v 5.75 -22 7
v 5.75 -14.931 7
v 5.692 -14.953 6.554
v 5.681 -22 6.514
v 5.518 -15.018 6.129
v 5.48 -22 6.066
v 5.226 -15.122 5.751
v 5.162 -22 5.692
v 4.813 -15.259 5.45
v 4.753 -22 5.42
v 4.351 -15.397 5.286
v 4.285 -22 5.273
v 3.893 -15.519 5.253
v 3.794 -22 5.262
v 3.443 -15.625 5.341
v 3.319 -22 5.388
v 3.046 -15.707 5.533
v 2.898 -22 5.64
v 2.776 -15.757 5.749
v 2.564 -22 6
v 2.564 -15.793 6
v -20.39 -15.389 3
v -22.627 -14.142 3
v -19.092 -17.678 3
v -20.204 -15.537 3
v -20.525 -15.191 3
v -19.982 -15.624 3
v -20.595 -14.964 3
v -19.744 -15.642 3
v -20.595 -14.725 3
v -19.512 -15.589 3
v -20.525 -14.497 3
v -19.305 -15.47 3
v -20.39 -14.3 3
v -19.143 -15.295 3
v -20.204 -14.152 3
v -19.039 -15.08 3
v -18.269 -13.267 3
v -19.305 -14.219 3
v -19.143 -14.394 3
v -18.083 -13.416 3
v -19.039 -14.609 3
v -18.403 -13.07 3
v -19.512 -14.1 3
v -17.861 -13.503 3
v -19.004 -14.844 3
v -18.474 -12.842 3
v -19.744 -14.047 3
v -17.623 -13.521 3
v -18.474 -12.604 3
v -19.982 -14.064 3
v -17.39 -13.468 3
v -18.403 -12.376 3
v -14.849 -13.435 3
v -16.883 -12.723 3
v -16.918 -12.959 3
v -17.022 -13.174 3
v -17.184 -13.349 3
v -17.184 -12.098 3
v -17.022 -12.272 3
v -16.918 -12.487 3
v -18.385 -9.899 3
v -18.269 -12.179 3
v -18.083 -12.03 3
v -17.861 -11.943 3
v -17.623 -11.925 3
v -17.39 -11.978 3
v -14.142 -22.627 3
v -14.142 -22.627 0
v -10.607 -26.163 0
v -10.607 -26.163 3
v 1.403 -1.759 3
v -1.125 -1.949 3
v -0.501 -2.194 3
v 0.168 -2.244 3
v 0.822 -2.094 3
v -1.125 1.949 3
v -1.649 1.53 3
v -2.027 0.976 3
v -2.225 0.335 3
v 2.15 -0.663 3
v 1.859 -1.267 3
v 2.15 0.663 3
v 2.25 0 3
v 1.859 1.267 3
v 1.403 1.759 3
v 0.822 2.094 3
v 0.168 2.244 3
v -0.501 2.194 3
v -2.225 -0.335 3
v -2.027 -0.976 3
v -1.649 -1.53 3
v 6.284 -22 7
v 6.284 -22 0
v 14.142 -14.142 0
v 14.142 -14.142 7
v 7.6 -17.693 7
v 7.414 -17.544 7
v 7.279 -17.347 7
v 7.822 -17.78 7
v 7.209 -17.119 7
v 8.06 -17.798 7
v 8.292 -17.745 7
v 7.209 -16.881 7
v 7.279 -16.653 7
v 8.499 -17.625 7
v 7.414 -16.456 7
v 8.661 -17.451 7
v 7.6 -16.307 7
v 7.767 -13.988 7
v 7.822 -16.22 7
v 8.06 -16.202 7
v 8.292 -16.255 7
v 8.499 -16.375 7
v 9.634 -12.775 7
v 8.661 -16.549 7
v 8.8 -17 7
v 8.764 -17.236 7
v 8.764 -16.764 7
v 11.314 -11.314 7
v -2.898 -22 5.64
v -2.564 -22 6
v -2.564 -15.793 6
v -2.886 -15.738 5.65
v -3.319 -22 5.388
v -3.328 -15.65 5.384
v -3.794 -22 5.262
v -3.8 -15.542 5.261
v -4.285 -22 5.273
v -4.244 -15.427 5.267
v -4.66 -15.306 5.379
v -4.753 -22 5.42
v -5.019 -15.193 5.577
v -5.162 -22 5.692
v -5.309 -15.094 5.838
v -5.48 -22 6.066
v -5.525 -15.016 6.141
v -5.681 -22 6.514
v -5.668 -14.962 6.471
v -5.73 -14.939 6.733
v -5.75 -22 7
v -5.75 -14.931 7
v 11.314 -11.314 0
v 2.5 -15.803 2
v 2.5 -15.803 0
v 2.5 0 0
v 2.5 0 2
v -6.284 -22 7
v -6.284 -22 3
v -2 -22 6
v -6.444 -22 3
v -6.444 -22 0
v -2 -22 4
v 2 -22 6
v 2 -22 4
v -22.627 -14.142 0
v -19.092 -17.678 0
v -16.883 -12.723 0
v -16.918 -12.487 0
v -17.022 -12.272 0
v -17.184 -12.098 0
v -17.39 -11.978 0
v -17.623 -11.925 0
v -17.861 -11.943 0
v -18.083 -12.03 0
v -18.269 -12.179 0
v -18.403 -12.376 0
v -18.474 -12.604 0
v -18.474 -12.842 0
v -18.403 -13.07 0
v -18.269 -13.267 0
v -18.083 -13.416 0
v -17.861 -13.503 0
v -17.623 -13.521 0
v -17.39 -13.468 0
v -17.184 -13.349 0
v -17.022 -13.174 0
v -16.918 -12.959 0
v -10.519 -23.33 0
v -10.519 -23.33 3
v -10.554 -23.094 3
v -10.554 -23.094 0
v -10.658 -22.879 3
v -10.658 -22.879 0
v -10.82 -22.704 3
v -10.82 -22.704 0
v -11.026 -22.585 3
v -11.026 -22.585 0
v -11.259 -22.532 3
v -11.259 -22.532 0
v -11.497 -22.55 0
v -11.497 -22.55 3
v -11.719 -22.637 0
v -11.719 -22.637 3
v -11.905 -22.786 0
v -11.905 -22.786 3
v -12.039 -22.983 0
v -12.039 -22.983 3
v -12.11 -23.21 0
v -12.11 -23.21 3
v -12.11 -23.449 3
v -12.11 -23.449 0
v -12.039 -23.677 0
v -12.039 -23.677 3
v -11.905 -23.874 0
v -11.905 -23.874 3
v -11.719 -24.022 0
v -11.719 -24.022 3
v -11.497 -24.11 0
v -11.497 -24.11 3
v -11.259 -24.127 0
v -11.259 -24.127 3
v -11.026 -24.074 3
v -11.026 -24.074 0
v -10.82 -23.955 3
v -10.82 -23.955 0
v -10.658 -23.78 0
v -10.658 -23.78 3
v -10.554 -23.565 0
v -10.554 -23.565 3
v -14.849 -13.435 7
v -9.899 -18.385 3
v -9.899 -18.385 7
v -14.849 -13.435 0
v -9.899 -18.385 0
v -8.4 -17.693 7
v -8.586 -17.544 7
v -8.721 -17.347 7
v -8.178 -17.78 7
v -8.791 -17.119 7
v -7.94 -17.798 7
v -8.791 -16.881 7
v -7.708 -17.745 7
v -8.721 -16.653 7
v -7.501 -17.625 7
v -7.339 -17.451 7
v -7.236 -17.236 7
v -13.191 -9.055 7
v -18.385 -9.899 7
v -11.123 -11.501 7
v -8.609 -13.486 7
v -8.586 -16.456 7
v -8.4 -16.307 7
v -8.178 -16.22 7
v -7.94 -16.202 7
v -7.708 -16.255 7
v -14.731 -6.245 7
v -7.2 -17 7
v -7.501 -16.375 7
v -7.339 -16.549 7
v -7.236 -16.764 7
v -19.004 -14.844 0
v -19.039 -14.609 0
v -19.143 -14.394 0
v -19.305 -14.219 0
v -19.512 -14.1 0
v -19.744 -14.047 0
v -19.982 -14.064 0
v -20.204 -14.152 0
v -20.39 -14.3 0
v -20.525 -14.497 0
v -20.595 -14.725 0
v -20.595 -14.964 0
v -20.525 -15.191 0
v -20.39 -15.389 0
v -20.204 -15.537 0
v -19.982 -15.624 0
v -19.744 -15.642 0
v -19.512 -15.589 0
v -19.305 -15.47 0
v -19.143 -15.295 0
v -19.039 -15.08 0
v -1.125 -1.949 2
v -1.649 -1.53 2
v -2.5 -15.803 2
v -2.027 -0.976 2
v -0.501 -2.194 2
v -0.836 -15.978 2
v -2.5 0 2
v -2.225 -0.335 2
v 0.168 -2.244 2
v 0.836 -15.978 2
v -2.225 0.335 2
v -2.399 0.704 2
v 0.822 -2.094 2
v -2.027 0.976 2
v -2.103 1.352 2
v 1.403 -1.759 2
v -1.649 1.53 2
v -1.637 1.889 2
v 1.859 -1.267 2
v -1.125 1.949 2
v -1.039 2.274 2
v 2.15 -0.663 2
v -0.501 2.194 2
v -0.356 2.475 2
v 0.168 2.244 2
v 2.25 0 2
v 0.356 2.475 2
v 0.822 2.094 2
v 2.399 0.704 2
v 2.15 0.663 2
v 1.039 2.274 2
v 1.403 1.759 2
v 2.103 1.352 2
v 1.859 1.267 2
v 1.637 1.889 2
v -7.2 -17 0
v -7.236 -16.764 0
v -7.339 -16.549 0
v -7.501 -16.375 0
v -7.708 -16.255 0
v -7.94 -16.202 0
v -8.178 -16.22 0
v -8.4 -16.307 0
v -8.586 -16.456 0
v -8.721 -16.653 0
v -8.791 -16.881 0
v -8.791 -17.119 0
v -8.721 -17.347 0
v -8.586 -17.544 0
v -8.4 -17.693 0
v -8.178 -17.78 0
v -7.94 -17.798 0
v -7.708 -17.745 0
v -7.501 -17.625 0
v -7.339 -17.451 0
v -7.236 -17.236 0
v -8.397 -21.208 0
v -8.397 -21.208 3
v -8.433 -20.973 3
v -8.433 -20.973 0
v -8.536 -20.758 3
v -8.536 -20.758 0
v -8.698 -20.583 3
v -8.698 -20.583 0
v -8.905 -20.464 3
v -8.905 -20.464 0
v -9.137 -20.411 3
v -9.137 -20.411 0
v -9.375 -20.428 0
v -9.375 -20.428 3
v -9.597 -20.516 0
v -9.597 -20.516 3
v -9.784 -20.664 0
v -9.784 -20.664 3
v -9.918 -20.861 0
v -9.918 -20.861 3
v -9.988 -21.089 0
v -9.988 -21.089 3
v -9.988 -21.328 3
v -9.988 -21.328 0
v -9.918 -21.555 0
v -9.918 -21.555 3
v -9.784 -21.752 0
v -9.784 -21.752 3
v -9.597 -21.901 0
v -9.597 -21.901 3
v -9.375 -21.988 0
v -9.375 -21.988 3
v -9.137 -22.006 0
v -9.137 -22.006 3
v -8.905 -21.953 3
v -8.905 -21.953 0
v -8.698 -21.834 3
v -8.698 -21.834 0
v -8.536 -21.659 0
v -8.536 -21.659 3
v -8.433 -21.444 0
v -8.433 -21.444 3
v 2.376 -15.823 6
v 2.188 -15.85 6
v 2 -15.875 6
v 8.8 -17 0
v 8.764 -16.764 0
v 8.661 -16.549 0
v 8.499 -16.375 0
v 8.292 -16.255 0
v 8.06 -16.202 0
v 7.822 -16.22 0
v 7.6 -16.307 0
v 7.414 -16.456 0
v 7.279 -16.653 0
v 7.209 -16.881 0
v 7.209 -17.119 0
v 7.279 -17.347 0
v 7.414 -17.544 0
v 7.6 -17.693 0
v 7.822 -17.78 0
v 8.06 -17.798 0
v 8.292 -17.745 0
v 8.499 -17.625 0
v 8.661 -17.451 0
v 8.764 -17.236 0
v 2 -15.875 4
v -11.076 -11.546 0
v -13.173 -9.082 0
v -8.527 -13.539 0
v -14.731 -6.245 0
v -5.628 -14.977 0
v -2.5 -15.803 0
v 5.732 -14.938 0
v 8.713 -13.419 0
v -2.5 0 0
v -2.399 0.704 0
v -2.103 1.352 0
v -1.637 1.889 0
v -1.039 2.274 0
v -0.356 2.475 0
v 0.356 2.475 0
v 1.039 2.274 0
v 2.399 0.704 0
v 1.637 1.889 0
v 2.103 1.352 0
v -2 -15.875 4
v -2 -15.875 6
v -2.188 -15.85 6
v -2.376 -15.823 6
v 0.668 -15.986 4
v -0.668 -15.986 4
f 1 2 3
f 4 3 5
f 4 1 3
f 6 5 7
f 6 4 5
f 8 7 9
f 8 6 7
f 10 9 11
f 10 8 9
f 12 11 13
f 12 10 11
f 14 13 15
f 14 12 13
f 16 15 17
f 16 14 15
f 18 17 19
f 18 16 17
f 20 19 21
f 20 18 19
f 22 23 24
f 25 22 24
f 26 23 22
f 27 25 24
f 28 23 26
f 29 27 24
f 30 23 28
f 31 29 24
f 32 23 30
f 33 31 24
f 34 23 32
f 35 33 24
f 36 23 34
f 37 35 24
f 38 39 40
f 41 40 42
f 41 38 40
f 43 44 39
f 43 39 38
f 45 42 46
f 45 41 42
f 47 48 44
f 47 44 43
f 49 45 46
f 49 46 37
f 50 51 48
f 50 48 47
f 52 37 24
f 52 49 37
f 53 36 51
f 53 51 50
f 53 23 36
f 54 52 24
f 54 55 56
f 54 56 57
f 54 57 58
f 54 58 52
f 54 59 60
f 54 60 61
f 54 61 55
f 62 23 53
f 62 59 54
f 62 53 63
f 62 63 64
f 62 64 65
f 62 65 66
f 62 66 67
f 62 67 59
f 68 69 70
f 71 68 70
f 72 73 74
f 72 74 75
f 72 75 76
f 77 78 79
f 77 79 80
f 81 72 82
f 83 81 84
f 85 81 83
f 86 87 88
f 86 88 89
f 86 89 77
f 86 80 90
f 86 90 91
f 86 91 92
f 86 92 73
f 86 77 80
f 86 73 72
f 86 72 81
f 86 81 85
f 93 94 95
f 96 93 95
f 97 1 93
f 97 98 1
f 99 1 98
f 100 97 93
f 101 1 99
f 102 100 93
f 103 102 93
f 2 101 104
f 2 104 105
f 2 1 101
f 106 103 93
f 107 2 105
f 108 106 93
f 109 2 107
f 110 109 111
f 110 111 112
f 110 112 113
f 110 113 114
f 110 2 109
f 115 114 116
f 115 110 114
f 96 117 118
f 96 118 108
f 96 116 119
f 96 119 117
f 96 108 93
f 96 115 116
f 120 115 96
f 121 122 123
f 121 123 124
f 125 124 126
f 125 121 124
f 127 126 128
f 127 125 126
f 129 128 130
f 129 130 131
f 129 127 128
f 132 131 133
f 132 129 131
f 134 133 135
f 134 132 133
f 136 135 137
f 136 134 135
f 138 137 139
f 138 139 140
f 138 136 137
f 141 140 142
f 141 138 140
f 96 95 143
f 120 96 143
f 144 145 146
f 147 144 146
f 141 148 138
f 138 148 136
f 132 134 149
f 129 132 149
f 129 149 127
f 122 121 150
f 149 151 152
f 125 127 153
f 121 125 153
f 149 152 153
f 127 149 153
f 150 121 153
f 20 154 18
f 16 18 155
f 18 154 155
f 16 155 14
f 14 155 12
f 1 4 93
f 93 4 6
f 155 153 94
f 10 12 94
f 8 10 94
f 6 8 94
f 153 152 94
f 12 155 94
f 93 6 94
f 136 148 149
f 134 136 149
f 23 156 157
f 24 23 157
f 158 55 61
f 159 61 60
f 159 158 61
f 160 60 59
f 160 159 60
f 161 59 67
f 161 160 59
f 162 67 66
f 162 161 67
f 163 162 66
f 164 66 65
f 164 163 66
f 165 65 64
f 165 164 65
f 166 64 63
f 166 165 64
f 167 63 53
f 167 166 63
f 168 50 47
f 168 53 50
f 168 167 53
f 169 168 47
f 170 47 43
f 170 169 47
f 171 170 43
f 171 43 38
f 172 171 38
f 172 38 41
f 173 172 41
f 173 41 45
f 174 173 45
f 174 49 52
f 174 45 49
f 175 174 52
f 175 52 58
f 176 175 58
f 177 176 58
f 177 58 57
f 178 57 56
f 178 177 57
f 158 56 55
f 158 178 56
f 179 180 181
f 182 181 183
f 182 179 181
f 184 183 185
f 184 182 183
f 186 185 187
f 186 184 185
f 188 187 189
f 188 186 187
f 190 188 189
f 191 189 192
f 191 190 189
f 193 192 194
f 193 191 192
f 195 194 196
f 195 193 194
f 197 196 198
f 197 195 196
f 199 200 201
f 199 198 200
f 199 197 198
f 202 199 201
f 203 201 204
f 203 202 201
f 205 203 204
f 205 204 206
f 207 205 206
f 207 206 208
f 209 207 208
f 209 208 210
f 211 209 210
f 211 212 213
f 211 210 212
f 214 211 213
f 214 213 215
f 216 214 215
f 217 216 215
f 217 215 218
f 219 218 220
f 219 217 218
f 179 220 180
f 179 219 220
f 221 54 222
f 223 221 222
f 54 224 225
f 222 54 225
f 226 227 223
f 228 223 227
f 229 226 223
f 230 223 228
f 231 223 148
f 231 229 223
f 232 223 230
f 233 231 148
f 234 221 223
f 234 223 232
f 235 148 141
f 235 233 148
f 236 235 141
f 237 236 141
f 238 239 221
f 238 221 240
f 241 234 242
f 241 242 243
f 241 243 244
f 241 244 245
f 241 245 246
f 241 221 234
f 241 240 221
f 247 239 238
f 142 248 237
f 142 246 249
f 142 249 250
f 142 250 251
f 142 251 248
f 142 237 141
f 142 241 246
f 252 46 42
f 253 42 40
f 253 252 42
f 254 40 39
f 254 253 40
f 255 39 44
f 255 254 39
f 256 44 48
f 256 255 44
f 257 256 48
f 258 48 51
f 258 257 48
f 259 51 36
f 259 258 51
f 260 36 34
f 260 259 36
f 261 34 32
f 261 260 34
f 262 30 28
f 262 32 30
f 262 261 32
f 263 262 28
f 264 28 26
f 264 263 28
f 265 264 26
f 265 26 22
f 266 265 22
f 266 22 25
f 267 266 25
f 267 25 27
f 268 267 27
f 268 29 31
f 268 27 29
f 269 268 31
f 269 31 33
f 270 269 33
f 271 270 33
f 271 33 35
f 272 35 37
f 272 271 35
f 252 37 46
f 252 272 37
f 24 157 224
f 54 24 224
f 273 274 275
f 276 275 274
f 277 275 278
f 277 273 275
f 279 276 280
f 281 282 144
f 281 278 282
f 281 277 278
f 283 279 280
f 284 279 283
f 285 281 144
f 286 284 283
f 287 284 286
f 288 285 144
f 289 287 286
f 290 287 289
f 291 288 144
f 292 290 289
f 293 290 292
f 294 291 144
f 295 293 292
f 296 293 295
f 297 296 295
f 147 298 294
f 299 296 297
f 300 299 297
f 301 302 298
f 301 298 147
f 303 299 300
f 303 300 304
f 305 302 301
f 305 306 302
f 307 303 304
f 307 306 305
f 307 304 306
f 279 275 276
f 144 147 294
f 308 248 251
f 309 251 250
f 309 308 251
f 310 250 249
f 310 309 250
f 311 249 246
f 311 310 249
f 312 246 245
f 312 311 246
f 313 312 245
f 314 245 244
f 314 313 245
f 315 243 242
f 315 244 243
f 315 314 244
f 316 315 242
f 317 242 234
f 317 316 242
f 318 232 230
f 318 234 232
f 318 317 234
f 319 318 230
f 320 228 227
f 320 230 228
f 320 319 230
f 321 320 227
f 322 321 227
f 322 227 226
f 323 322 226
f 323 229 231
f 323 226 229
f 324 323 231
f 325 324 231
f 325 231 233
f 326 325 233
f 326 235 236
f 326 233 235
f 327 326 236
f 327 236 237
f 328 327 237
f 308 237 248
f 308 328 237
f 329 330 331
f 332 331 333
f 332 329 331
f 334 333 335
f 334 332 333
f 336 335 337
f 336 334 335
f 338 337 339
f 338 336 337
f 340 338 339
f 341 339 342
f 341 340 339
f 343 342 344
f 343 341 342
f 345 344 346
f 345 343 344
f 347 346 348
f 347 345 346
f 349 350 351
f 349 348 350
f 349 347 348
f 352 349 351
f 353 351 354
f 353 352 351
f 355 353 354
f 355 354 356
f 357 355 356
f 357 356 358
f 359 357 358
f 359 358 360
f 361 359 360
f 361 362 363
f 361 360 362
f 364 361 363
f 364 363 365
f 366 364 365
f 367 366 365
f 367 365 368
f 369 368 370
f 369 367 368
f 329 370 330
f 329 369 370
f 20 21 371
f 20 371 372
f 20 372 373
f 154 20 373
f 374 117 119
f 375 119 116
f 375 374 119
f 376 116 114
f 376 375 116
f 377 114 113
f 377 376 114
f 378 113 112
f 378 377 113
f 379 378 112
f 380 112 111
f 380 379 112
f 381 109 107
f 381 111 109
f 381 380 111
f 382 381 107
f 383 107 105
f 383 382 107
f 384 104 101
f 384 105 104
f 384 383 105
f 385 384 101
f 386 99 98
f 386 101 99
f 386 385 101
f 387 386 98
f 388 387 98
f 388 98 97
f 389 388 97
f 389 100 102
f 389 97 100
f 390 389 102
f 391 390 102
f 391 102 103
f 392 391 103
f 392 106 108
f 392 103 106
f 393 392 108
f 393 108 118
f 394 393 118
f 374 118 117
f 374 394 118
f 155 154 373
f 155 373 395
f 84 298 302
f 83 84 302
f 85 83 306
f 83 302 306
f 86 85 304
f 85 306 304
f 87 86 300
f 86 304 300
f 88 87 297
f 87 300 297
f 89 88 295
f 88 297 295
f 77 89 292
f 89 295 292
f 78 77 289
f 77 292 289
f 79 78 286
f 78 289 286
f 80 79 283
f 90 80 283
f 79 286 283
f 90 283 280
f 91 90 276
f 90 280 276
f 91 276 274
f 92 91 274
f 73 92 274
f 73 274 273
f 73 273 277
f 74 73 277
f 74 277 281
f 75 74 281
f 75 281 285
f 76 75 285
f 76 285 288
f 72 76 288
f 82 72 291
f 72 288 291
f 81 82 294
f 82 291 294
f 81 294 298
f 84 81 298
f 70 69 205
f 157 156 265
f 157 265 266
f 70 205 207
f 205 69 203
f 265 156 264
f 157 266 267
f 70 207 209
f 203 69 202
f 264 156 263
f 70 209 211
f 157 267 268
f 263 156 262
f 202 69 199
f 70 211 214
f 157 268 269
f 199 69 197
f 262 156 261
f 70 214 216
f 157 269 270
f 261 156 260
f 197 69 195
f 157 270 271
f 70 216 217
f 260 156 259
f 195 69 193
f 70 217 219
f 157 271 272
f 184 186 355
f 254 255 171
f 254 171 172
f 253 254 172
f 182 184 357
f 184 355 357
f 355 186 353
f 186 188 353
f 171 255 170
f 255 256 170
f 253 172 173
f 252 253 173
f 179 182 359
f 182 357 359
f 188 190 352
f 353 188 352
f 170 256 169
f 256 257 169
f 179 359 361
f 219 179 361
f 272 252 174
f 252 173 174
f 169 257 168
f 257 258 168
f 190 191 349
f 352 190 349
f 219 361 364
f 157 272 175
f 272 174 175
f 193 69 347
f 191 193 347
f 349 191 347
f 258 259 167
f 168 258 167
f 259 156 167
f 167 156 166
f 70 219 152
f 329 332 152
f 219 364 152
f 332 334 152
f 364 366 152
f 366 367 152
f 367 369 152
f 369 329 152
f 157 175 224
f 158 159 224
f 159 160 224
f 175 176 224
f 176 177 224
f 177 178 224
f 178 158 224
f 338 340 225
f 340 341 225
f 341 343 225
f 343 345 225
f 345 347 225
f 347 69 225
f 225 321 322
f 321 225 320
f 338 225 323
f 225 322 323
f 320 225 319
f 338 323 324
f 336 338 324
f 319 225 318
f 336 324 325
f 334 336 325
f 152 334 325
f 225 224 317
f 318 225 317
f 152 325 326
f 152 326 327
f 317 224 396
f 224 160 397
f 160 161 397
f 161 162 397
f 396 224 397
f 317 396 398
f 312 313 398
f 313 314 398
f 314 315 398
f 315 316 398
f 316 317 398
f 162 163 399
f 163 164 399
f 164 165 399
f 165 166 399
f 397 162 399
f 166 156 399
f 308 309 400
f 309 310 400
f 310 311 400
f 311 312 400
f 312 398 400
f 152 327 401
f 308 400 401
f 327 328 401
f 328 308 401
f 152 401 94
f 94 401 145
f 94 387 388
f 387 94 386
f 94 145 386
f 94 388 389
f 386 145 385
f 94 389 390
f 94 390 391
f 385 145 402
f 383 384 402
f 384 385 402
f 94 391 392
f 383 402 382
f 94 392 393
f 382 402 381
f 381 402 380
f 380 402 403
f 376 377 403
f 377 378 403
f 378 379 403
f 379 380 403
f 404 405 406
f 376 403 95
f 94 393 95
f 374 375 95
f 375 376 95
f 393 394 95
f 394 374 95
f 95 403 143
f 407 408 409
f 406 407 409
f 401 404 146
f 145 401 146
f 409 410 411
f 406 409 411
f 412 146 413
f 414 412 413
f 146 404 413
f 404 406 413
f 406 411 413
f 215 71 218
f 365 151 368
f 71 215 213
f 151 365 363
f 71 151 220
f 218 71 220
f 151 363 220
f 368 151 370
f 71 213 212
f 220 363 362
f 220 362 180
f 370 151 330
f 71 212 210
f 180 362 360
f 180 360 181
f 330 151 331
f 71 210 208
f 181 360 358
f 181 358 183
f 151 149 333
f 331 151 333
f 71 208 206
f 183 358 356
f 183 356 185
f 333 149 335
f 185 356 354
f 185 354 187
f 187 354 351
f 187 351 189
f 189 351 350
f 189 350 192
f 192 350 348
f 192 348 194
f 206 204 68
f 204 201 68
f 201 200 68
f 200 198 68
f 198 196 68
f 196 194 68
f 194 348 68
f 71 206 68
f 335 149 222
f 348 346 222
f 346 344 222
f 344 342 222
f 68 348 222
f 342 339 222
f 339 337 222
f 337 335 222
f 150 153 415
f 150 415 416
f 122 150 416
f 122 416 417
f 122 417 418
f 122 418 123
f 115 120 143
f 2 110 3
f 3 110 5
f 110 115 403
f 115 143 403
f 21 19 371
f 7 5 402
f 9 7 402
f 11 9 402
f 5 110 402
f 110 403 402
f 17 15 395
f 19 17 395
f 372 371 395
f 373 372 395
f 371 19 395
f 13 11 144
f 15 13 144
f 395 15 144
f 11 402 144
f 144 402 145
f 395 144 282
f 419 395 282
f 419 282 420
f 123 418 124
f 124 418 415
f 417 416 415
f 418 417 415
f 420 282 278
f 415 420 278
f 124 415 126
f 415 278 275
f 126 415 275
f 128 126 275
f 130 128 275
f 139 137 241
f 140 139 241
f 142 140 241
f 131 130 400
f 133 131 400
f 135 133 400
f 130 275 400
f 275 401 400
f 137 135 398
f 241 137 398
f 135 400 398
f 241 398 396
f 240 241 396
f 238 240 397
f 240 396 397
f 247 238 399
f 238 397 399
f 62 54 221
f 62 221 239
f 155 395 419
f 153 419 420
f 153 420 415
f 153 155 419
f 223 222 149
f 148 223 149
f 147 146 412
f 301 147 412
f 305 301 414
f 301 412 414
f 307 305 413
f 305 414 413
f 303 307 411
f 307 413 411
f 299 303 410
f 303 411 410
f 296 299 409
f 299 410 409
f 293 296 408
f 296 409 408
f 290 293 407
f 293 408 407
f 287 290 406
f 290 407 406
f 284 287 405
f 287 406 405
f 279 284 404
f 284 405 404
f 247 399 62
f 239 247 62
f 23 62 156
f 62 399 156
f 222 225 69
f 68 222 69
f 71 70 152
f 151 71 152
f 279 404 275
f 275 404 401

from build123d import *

# Parameters (mm, degrees)
BOSS_EXTRUDE1_DEPTH = 7
BOSS_EXTRUDE2_DEPTH = 2
BOSS_EXTRUDE3_START = 2
SKETCH3_R           = 2.25
BOSS_EXTRUDE3_DEPTH = 1
CABLE_START         = -22.5
SKETCH6_R           = 1.75
CABLE_TUBES_DEPTH   = 20
WIRE_START          = -22.5
WIRE_CANALS_DEPTH   = 8
SKETCH4_R           = 0.8
SCREW_HOLES_DEPTH   = 8.0000001
CUT_EXTRUDE2_START  = 3
CUT_EXTRUDE2_DEPTH  = 4


with BuildPart() as part:
    # Sketch1 → Boss-Extrude1 (new body)
    with BuildSketch(Plane.XY):
        with BuildLine():
            Line((14.142135624, -14.142135624), (11.313708499, -11.313708499))
            ThreePointArc((11.313708499, -11.313708499), (-3.056276198, -15.70538684), (-14.730729168, -6.245447796))
            Line((-14.730729168, -6.245447796), (-22.627416999, -14.142135627))
            Line((-22.627416999, -14.142135627), (-19.091883095, -17.677669532))
            Line((-19.091883095, -17.677669532), (-14.849242408, -13.435028845))
            Line((-14.849242408, -13.435028845), (-9.899494939, -18.384776313))
            Line((-9.899494939, -18.384776313), (-14.142135626, -22.627417))
            Line((-14.142135626, -22.627417), (-10.60660172, -26.162950906))
            Line((-10.60660172, -26.162950906), (-6.443650814, -22))
            Line((-6.443650814, -22), (6.284271247, -22))
            Line((6.284271247, -22), (14.142135624, -14.142135624))
        make_face()
    extrude(amount=BOSS_EXTRUDE1_DEPTH)

    # Sketch2 → Boss-Extrude2 (add)
    with BuildSketch(Plane.XY):
        with BuildLine():
            Line((-2.5, 0), (-2.5, -22))
            Line((-2.5, -22), (2.5, -22))
            Line((2.5, -22), (2.5, 0))
            ThreePointArc((2.5, 0), (0, 2.5), (-2.5, 0))
        make_face()
    extrude(amount=BOSS_EXTRUDE2_DEPTH)

    # Sketch3 → Boss-Extrude3 (add)
    with BuildSketch(Plane.XY.offset(BOSS_EXTRUDE3_START)):
        Circle(SKETCH3_R)
    extrude(amount=BOSS_EXTRUDE3_DEPTH)

    # Sketch6 → Cable Tubes (cut)
    with BuildSketch(Plane(origin=(0, 0, 0), x_dir=(1, 0, 0), z_dir=(0, 1, 0)).offset(CABLE_START)):
        with Locations((-4, -7)):
            Circle(SKETCH6_R)
        with Locations((4, -7)):
            Circle(SKETCH6_R)
    extrude(amount=CABLE_TUBES_DEPTH, mode=Mode.SUBTRACT)

    # Sketch7 → Wire Canals (cut)
    with BuildSketch(Plane(origin=(0, 0, 0), x_dir=(1, 0, 0), z_dir=(0, 1, 0)).offset(WIRE_START)):
        Polygon((-3, -7), (3, -7), (3, -6), (2, -6), (2, -4), (-2, -4), (-2, -6), (-3, -6), align=None)
    extrude(amount=WIRE_CANALS_DEPTH, mode=Mode.SUBTRACT)

    # Sketch4 → Screw Holes (cut, through all)
    with BuildSketch(Plane.XY):
        with Locations((-11.318596704, -23.329658004)):
            Circle(SKETCH4_R)
        with Locations((-17.682557735, -12.723056286)):
            Circle(SKETCH4_R)
        with Locations((8, -17)):
            Circle(SKETCH4_R)
        with Locations((-9.197276361, -21.20833766)):
            Circle(SKETCH4_R)
        with Locations((-8, -17)):
            Circle(SKETCH4_R)
        with Locations((-19.803878078, -14.84437663)):
            Circle(SKETCH4_R)
    extrude(amount=SCREW_HOLES_DEPTH, mode=Mode.SUBTRACT)

    # Sketch10 → Cut-Extrude2 (cut)
    with BuildSketch(Plane.XY.offset(CUT_EXTRUDE2_START)):
        Polygon((-19.091883095, -17.677669532), (-14.849242408, -13.435028845), (-18.384776312, -9.89949494), (-22.627416999, -14.142135627), align=None)
        Polygon((-14.142135626, -22.627417), (-9.899494939, -18.384776313), (-6.284271253, -22), (-6.443650814, -22), (-10.60660172, -26.162950906), align=None)
    extrude(amount=CUT_EXTRUDE2_DEPTH, mode=Mode.SUBTRACT)


solid = part.part
